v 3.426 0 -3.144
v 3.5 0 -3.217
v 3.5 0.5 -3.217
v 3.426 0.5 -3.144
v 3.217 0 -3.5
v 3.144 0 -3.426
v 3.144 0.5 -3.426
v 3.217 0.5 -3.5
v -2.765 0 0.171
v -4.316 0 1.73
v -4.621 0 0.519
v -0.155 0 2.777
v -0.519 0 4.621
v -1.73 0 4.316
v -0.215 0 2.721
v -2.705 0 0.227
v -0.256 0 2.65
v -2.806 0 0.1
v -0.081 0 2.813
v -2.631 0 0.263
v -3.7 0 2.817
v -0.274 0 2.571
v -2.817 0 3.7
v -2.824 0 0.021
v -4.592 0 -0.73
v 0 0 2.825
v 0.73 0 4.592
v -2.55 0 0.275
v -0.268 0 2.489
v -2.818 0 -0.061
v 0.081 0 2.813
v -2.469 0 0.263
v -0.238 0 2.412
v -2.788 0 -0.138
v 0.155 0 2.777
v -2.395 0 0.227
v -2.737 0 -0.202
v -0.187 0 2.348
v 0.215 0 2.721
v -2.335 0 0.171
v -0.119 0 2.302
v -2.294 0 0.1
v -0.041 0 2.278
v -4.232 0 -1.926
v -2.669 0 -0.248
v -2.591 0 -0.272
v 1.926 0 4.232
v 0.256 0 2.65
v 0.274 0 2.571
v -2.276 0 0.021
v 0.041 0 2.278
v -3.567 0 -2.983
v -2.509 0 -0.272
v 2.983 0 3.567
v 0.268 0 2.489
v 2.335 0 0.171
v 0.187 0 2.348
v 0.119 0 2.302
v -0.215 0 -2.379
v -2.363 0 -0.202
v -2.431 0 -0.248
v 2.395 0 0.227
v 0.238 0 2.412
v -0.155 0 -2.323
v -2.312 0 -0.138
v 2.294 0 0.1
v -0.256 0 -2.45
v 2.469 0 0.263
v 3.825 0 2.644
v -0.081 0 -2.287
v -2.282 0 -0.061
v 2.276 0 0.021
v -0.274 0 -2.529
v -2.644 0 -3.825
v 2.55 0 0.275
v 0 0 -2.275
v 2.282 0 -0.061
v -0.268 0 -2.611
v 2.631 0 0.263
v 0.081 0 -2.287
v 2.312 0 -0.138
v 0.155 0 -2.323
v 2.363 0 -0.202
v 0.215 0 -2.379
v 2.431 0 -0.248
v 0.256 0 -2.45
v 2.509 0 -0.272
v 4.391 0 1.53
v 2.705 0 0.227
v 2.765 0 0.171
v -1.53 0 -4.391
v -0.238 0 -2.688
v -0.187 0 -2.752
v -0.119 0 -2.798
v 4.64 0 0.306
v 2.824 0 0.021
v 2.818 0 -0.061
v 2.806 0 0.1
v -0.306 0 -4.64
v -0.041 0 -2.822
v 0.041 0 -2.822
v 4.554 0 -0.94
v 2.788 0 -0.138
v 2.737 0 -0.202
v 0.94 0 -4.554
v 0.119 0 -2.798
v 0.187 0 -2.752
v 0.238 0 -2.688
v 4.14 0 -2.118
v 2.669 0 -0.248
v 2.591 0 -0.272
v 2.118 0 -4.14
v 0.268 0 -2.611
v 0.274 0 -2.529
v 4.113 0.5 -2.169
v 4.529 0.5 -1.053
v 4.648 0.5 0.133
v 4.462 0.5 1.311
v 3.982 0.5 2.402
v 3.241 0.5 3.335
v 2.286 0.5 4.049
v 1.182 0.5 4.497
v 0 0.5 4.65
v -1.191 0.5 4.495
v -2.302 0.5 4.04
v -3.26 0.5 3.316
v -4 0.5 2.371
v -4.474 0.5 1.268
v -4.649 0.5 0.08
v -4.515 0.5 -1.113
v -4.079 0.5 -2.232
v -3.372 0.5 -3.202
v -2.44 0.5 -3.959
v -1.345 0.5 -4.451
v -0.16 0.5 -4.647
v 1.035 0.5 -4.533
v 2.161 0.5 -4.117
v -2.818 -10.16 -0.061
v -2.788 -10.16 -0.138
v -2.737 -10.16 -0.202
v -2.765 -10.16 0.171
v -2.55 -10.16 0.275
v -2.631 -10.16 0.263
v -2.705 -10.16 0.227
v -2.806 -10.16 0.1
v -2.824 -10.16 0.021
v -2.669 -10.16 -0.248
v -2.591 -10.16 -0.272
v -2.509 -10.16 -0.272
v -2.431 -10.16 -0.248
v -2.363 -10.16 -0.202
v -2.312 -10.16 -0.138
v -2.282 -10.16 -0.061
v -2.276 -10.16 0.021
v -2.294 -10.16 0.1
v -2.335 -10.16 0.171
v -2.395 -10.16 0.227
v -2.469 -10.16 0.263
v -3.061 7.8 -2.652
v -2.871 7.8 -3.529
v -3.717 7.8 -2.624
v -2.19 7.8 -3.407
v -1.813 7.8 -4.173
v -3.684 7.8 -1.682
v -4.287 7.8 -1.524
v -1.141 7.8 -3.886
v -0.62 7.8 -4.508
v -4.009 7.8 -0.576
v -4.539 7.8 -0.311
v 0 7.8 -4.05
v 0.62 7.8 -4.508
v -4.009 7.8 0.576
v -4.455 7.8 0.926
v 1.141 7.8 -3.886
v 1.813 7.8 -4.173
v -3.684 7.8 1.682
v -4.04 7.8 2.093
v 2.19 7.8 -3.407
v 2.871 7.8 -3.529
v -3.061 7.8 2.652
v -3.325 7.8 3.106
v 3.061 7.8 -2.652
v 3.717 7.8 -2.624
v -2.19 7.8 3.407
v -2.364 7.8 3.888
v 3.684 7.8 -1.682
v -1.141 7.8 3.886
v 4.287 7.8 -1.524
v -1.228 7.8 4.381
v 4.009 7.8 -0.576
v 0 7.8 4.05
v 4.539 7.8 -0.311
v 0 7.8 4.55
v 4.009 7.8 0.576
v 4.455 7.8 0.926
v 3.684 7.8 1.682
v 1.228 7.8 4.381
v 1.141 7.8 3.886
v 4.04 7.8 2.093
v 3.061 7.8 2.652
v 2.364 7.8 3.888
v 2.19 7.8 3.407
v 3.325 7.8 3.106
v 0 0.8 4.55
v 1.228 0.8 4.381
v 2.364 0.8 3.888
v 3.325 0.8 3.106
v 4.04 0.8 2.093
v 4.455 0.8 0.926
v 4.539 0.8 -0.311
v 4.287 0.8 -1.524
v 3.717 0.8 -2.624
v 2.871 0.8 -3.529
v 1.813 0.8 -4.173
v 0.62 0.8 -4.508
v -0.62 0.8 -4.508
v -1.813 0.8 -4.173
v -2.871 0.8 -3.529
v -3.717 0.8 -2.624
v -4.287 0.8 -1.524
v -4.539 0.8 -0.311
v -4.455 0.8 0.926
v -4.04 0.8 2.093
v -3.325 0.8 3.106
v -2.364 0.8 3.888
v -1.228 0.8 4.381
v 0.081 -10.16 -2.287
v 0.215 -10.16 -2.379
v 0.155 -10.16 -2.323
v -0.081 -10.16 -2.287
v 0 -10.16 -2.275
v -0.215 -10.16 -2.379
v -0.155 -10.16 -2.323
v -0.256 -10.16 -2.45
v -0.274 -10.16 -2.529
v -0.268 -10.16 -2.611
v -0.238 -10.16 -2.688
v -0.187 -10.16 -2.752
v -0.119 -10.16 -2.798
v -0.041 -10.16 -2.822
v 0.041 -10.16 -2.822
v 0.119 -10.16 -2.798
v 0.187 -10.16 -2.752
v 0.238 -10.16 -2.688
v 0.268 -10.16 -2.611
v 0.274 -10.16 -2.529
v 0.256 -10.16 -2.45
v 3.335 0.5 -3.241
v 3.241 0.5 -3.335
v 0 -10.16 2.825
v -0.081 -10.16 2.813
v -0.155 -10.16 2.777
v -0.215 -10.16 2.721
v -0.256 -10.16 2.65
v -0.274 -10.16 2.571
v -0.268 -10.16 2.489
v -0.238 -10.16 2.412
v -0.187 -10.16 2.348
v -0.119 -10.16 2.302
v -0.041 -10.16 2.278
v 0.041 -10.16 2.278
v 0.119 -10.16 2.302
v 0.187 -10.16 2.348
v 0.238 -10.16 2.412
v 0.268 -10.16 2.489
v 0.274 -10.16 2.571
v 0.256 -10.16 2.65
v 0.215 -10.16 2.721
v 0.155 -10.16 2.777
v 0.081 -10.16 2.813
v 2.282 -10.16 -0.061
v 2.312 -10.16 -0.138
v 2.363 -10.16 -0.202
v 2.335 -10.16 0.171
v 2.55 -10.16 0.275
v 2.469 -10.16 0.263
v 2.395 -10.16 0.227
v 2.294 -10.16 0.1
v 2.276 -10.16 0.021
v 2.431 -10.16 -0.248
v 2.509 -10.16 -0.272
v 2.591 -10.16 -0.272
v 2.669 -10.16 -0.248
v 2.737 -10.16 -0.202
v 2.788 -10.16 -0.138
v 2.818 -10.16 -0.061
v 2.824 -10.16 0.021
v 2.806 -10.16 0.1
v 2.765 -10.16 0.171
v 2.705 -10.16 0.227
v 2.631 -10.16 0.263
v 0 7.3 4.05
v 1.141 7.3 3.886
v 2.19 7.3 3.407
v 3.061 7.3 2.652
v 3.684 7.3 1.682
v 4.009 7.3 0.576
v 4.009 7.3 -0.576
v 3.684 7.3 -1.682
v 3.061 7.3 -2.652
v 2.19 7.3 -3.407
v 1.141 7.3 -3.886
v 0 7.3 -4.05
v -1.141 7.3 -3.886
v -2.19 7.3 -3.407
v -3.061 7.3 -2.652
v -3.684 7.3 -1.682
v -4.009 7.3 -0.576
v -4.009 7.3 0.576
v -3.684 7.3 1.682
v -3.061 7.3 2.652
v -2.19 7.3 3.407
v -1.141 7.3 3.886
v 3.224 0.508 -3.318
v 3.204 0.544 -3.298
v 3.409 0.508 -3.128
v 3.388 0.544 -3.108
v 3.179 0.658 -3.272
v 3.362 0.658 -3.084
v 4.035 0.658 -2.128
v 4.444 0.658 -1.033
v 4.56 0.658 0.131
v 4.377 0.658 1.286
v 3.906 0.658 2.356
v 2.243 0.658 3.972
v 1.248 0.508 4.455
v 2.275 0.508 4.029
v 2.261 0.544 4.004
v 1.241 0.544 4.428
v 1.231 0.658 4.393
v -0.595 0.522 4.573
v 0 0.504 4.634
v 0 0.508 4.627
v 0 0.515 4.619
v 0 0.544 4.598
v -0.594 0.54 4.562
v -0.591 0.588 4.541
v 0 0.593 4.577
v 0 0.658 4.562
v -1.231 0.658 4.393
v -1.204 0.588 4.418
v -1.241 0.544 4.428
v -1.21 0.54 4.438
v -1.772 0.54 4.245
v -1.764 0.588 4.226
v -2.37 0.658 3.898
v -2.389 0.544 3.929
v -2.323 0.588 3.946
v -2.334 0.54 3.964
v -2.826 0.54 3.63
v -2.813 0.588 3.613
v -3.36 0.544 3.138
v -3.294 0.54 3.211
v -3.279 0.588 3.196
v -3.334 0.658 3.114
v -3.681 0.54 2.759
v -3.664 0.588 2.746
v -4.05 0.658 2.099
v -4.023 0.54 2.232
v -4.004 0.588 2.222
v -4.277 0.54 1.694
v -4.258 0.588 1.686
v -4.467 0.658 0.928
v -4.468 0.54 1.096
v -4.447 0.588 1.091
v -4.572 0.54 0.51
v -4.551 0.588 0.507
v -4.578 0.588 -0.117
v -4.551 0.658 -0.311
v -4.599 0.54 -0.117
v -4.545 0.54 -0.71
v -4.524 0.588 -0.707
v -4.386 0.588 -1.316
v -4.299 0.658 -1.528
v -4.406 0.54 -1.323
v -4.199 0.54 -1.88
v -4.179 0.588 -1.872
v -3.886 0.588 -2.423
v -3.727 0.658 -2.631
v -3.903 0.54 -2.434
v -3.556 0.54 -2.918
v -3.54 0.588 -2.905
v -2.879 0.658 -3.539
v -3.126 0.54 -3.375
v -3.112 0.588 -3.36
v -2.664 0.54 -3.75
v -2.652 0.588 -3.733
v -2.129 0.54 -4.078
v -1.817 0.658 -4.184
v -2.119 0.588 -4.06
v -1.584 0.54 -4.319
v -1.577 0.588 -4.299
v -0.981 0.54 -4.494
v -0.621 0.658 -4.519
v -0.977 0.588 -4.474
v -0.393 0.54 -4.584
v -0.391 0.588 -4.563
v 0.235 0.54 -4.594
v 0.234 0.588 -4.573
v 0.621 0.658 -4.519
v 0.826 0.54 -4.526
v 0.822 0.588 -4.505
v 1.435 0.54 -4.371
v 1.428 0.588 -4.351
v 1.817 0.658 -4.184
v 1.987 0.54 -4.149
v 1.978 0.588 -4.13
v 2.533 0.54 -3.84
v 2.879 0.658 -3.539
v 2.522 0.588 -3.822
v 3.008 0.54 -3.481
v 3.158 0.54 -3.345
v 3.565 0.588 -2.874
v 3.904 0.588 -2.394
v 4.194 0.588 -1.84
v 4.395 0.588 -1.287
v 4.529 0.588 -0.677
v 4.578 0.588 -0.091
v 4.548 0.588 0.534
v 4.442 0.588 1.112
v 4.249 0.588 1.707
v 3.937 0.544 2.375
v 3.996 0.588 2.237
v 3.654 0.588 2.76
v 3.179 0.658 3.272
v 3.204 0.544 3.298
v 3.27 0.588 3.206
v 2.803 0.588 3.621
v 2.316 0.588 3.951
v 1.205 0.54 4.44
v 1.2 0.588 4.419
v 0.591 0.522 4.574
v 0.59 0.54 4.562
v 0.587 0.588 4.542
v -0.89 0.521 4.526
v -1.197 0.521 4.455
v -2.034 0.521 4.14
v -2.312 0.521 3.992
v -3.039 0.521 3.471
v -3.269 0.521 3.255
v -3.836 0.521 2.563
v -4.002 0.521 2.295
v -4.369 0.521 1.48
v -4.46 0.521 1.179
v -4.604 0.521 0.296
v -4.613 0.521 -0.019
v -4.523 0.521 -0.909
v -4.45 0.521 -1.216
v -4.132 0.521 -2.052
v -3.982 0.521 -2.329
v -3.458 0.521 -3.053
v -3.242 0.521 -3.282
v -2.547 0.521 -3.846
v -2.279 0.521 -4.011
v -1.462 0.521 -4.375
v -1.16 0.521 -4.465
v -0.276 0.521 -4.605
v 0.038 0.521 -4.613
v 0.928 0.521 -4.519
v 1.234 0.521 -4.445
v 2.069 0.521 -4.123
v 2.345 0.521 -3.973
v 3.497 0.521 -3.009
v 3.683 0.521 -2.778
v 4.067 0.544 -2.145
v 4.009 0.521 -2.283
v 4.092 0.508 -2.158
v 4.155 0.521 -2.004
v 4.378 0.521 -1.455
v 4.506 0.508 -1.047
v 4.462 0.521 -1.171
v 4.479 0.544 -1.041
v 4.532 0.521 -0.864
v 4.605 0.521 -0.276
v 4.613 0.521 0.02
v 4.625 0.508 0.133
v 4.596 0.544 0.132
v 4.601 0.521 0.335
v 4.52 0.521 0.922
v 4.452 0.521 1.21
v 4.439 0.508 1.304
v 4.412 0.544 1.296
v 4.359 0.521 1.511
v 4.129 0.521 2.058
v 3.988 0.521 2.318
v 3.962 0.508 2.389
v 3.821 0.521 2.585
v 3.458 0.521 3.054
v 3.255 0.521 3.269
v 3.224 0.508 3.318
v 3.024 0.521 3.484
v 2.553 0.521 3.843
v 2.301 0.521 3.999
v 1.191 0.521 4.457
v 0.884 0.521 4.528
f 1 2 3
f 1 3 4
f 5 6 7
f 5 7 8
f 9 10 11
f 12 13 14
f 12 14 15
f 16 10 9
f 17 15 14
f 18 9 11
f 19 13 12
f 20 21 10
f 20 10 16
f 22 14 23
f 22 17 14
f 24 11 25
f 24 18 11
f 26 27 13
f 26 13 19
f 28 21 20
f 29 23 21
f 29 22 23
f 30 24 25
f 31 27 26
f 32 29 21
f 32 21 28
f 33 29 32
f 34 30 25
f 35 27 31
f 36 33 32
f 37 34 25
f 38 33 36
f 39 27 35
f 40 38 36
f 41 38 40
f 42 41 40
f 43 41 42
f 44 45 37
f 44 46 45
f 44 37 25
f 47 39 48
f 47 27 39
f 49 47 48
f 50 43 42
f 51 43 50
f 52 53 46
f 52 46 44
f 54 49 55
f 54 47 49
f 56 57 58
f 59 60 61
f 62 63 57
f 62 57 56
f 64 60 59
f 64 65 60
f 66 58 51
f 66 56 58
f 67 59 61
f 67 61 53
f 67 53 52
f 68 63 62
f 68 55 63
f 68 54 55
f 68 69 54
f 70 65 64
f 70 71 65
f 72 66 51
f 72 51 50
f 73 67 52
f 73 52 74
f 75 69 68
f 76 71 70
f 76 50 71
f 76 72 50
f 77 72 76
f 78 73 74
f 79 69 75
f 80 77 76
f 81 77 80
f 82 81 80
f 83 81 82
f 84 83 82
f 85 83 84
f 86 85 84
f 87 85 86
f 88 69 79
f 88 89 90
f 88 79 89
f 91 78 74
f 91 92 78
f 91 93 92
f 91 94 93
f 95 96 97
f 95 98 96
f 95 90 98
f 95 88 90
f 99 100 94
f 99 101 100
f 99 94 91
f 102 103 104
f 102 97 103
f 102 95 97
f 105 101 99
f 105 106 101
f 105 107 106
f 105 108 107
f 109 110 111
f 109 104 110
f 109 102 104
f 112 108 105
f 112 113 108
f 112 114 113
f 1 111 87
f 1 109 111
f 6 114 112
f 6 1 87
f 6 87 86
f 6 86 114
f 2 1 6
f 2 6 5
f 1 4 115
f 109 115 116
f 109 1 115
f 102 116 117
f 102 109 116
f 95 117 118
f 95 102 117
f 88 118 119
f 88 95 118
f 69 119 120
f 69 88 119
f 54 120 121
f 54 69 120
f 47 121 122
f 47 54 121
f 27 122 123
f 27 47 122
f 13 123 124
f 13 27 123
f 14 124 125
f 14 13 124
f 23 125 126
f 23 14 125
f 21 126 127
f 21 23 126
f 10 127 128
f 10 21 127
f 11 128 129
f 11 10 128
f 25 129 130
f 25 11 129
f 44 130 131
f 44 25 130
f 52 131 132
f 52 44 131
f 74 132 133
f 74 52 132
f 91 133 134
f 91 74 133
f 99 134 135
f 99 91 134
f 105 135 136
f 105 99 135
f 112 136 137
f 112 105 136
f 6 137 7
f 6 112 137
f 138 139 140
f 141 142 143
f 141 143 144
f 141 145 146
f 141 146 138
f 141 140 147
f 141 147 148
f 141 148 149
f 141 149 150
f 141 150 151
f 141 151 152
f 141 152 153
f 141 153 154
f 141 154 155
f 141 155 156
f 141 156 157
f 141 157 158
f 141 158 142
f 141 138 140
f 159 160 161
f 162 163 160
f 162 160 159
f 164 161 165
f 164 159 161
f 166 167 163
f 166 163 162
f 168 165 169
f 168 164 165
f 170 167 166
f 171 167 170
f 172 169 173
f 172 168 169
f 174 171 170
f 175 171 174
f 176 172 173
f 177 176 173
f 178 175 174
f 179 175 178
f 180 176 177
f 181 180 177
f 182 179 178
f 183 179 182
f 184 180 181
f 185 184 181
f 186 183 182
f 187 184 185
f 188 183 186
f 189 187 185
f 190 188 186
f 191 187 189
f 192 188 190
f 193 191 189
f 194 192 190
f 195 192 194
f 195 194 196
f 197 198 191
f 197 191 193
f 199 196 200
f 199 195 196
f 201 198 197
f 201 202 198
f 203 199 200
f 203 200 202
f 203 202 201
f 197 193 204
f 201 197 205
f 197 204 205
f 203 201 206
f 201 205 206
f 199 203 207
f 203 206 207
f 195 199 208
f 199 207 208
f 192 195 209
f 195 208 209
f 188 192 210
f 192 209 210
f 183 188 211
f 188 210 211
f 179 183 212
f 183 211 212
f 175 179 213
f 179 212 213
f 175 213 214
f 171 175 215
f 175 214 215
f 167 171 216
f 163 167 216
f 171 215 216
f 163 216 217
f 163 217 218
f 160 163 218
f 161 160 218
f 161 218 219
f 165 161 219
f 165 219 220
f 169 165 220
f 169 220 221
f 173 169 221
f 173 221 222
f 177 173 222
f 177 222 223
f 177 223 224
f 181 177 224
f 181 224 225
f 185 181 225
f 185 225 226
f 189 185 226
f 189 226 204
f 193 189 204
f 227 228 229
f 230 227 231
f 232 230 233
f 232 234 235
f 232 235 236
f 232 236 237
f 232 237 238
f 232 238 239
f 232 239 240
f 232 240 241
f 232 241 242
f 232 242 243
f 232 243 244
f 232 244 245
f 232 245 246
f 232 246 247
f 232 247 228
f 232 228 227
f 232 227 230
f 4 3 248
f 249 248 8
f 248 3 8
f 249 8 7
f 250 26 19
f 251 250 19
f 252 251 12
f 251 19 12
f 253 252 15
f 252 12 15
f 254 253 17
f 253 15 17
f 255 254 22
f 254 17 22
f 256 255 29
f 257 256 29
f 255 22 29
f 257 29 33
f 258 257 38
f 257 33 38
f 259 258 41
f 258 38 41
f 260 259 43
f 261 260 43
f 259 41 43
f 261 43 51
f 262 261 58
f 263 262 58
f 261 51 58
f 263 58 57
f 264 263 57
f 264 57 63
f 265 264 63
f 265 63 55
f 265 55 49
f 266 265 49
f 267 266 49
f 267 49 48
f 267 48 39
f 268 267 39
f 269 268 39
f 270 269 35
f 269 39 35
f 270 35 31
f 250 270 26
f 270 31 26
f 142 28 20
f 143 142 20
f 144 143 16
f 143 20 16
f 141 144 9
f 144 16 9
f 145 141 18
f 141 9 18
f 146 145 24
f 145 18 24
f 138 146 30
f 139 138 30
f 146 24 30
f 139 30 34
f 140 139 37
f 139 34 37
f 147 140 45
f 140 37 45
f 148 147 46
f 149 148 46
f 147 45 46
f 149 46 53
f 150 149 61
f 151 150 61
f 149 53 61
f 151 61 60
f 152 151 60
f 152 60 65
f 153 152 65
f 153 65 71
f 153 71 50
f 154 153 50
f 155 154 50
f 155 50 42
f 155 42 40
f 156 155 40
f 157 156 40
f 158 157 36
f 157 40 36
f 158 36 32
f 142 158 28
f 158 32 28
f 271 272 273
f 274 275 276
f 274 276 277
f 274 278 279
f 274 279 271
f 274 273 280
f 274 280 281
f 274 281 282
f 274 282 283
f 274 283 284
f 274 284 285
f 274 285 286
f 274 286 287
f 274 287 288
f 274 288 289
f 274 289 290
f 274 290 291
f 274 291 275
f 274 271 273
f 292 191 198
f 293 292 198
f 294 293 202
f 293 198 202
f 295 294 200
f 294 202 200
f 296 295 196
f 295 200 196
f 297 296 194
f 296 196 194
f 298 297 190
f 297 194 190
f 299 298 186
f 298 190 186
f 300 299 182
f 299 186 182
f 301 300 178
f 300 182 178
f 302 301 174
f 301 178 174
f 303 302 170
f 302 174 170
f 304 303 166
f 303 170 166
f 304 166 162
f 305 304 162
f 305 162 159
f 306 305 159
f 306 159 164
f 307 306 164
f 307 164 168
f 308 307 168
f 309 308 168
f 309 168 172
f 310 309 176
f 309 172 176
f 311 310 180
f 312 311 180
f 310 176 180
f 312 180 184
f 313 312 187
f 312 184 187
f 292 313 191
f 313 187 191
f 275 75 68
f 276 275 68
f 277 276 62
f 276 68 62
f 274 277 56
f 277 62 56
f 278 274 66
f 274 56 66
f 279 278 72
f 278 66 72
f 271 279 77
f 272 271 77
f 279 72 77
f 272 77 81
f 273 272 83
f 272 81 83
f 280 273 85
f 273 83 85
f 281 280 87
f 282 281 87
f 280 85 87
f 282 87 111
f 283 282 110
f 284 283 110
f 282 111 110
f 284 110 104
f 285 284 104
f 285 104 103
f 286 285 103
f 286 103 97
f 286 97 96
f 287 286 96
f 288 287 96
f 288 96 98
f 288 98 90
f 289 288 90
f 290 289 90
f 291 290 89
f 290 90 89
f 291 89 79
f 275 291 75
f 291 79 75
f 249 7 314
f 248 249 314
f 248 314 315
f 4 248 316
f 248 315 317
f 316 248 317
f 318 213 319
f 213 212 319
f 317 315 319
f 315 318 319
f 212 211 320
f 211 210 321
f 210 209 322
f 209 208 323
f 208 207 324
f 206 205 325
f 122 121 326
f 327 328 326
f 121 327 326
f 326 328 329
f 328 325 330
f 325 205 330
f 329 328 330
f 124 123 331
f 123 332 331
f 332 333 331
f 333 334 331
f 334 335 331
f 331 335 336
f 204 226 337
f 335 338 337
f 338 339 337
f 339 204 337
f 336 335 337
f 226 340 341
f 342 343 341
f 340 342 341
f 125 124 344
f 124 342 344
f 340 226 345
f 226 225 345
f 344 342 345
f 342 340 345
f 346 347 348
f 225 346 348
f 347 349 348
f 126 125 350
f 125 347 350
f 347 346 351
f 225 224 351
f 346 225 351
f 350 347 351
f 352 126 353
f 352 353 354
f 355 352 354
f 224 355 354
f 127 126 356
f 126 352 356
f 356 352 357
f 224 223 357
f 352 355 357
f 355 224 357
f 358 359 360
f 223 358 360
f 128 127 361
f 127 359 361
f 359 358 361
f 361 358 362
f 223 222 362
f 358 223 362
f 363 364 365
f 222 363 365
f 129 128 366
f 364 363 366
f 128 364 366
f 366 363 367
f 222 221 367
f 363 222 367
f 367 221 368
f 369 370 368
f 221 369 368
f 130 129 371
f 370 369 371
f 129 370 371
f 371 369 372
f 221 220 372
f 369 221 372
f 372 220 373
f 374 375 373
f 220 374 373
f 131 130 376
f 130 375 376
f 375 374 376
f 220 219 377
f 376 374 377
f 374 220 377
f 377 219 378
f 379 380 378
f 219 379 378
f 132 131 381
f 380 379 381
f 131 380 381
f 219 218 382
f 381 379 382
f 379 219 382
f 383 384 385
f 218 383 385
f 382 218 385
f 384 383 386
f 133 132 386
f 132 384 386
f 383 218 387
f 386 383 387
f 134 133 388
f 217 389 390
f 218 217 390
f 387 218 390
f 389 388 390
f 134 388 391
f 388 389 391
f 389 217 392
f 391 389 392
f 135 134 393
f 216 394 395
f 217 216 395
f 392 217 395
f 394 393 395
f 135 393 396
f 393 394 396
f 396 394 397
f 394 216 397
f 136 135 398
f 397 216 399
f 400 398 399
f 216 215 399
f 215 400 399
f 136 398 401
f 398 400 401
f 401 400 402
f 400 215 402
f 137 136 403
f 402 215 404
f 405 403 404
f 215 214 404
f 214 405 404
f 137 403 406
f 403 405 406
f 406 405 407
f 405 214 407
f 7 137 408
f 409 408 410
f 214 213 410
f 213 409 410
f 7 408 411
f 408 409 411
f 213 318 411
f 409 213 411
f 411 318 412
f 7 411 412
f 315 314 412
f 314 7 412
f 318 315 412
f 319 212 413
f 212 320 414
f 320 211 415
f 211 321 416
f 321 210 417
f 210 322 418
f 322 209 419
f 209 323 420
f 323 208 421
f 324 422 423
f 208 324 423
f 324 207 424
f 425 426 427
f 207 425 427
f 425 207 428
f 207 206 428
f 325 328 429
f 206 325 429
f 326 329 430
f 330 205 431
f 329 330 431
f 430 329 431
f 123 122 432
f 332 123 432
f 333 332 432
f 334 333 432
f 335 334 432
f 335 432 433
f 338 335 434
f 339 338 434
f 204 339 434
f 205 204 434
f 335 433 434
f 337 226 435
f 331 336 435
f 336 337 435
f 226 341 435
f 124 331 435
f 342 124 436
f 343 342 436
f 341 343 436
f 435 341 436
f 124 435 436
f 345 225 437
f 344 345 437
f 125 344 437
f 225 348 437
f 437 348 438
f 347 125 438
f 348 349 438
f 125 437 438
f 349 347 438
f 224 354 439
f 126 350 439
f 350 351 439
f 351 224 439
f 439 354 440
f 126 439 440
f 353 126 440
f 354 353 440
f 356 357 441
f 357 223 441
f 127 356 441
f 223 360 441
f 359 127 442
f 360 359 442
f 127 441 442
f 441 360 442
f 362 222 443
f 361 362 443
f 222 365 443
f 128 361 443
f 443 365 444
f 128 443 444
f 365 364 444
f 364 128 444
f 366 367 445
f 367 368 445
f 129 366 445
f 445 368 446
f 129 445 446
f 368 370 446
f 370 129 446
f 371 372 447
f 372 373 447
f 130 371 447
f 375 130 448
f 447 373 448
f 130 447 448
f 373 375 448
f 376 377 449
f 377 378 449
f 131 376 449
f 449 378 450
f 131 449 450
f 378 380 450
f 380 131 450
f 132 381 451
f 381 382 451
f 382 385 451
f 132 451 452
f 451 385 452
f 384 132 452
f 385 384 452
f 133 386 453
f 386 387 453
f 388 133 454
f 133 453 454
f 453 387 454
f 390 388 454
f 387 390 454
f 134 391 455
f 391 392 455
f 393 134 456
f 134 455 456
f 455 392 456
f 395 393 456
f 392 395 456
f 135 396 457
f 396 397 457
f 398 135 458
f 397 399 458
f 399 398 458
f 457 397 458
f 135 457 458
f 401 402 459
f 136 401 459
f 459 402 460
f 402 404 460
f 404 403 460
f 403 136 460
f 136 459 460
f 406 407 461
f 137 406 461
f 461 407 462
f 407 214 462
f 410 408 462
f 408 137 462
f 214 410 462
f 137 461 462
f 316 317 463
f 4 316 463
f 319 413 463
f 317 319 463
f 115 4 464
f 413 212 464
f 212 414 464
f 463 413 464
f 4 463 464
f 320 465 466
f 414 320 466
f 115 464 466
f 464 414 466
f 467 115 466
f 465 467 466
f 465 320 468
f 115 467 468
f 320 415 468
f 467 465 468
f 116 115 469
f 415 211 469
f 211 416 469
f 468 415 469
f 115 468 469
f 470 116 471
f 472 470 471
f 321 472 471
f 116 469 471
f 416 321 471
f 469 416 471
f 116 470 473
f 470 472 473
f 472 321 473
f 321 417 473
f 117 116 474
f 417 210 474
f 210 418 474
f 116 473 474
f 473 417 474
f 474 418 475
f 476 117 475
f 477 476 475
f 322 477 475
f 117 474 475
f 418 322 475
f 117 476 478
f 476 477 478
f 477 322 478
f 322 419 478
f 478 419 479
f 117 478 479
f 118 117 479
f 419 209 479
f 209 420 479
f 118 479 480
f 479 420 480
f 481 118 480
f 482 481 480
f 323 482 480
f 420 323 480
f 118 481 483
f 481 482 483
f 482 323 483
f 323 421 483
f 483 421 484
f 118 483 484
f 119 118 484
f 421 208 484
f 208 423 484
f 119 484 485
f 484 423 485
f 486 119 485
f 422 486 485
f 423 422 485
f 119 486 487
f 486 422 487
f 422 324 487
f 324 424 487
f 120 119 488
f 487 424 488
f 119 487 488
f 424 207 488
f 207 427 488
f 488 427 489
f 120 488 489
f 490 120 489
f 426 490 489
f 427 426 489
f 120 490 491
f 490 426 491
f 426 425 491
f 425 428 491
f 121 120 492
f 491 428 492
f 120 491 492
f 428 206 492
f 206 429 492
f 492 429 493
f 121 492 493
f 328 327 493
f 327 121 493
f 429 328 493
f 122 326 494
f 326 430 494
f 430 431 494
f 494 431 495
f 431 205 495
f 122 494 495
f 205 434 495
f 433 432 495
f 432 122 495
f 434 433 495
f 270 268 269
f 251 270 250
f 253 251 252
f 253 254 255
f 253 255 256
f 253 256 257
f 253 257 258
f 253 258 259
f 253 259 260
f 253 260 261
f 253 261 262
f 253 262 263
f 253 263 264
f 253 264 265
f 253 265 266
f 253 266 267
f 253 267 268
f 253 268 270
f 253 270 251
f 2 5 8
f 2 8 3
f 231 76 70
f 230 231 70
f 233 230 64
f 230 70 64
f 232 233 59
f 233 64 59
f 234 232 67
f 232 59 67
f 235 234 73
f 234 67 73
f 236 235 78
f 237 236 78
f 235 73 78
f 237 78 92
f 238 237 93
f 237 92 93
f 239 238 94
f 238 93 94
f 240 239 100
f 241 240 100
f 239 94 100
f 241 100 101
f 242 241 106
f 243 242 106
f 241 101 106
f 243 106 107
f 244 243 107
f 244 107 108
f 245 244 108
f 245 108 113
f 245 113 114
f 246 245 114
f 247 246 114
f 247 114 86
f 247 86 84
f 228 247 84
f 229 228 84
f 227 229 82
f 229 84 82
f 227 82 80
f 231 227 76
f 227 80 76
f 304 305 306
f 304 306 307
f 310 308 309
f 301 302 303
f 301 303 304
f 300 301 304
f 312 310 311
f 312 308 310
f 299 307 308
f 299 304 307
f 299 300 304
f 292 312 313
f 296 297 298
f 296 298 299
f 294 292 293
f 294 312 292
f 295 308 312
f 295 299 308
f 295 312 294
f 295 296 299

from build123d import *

# Parameters (mm, degrees)
SKETCH1_R           = 4.55
BOSS_EXTRUDE1_DEPTH = 7.8
SKETCH2_R           = 4.050000028
CUT_EXTRUDE1_DEPTH  = 0.5
SKETCH3_R           = 0.275
BOSS_EXTRUDE2_DEPTH = 10.16
SKETCH4_R           = 4.65
BOSS_EXTRUDE3_DEPTH = 0.5
FILLET1_SIZE        = 0.1
FILLET1_SIZE_2      = 0.3
BOSS_EXTRUDE4_DEPTH = 0.5


with BuildPart() as part:
    # Sketch1 → Boss-Extrude1 (new body)
    with BuildSketch(Plane(origin=(0, 0, 0), x_dir=(1, 0, 0), z_dir=(0, 1, 0))):
        with Locations(Location((0, 0, 0), (0, 0, 270))):
            Circle(SKETCH1_R)
    extrude(amount=BOSS_EXTRUDE1_DEPTH)

    # Sketch2 → Cut-Extrude1 (cut)
    with BuildSketch(Plane(origin=(0, 7.8, 0), x_dir=(1, 0, 0), z_dir=(0, 1, 0))):
        with Locations(Location((0, 0, 0), (0, 0, 270))):
            Circle(SKETCH2_R)
    extrude(amount=-CUT_EXTRUDE1_DEPTH, mode=Mode.SUBTRACT)

    # Sketch3 → Boss-Extrude2 (add)
    with BuildSketch(Plane(origin=(0, 0, 0), x_dir=(-1, 0, 0), z_dir=(0, -1, 0))):
        with Locations(Location((0, 2.55, 0), (0, 0, 270))):
            Circle(SKETCH3_R)
        with Locations(Location((2.55, 0, 0), (0, 0, 270))):
            Circle(SKETCH3_R)
        with Locations(Location((0, -2.55, 0), (0, 0, 270))):
            Circle(SKETCH3_R)
        with Locations(Location((-2.55, 0, 0), (0, 0, 270))):
            Circle(SKETCH3_R)
    extrude(amount=BOSS_EXTRUDE2_DEPTH)

    # Sketch4 → Boss-Extrude3 (add)
    with BuildSketch(Plane(origin=(0, 0, 0), x_dir=(-1, 0, 0), z_dir=(0, -1, 0))):
        with Locations(Location((0, 0, 0), (0, 0, 90))):
            Circle(SKETCH4_R)
    extrude(amount=-BOSS_EXTRUDE3_DEPTH)

    # Fillet1
    # an asymmetric fillet: 0.3, 0.1 mm, written as the material it adds along each edge
    with BuildSketch(Plane(origin=(0, 0.5, 0), x_dir=(0, 0, 1), z_dir=(1, 0, 0))) as fillet1_piece_1_section:
        with BuildLine():
            Bezier((4.55 + FILLET1_SIZE, 0), (4.55, 0), (4.55, -FILLET1_SIZE_2), weights=[1, 0.707106781, 1])
            Line((4.55, -FILLET1_SIZE_2), (4.55, 0))
            Line((4.55, 0), (4.55 + FILLET1_SIZE, 0))
        make_face()
    fillet1_piece_1 = revolve(axis=Axis((0, 0.5, 0), (0, -1, 0)), mode=Mode.PRIVATE)
    fillet1_piece_1 = fillet1_piece_1 & Plane(origin=(0, 0.585863309, 0), x_dir=(0, 0, -1), z_dir=(0, -1, 0)) * Cylinder(4.65, 19, mode=Mode.PRIVATE)
    add(fillet1_piece_1)

    # Sketch5 → Boss-Extrude4 (add)
    with BuildSketch(Plane(origin=(0, 0, 0), x_dir=(-1, 0, 0), z_dir=(0, -1, 0))):
        Polygon((-3.075914781, 3.358756928), (-3.217336137, 3.500178284), (-3.500178284, 3.217336137), (-3.358756928, 3.075914781), align=None)
    extrude(amount=-BOSS_EXTRUDE4_DEPTH)


solid = part.part
